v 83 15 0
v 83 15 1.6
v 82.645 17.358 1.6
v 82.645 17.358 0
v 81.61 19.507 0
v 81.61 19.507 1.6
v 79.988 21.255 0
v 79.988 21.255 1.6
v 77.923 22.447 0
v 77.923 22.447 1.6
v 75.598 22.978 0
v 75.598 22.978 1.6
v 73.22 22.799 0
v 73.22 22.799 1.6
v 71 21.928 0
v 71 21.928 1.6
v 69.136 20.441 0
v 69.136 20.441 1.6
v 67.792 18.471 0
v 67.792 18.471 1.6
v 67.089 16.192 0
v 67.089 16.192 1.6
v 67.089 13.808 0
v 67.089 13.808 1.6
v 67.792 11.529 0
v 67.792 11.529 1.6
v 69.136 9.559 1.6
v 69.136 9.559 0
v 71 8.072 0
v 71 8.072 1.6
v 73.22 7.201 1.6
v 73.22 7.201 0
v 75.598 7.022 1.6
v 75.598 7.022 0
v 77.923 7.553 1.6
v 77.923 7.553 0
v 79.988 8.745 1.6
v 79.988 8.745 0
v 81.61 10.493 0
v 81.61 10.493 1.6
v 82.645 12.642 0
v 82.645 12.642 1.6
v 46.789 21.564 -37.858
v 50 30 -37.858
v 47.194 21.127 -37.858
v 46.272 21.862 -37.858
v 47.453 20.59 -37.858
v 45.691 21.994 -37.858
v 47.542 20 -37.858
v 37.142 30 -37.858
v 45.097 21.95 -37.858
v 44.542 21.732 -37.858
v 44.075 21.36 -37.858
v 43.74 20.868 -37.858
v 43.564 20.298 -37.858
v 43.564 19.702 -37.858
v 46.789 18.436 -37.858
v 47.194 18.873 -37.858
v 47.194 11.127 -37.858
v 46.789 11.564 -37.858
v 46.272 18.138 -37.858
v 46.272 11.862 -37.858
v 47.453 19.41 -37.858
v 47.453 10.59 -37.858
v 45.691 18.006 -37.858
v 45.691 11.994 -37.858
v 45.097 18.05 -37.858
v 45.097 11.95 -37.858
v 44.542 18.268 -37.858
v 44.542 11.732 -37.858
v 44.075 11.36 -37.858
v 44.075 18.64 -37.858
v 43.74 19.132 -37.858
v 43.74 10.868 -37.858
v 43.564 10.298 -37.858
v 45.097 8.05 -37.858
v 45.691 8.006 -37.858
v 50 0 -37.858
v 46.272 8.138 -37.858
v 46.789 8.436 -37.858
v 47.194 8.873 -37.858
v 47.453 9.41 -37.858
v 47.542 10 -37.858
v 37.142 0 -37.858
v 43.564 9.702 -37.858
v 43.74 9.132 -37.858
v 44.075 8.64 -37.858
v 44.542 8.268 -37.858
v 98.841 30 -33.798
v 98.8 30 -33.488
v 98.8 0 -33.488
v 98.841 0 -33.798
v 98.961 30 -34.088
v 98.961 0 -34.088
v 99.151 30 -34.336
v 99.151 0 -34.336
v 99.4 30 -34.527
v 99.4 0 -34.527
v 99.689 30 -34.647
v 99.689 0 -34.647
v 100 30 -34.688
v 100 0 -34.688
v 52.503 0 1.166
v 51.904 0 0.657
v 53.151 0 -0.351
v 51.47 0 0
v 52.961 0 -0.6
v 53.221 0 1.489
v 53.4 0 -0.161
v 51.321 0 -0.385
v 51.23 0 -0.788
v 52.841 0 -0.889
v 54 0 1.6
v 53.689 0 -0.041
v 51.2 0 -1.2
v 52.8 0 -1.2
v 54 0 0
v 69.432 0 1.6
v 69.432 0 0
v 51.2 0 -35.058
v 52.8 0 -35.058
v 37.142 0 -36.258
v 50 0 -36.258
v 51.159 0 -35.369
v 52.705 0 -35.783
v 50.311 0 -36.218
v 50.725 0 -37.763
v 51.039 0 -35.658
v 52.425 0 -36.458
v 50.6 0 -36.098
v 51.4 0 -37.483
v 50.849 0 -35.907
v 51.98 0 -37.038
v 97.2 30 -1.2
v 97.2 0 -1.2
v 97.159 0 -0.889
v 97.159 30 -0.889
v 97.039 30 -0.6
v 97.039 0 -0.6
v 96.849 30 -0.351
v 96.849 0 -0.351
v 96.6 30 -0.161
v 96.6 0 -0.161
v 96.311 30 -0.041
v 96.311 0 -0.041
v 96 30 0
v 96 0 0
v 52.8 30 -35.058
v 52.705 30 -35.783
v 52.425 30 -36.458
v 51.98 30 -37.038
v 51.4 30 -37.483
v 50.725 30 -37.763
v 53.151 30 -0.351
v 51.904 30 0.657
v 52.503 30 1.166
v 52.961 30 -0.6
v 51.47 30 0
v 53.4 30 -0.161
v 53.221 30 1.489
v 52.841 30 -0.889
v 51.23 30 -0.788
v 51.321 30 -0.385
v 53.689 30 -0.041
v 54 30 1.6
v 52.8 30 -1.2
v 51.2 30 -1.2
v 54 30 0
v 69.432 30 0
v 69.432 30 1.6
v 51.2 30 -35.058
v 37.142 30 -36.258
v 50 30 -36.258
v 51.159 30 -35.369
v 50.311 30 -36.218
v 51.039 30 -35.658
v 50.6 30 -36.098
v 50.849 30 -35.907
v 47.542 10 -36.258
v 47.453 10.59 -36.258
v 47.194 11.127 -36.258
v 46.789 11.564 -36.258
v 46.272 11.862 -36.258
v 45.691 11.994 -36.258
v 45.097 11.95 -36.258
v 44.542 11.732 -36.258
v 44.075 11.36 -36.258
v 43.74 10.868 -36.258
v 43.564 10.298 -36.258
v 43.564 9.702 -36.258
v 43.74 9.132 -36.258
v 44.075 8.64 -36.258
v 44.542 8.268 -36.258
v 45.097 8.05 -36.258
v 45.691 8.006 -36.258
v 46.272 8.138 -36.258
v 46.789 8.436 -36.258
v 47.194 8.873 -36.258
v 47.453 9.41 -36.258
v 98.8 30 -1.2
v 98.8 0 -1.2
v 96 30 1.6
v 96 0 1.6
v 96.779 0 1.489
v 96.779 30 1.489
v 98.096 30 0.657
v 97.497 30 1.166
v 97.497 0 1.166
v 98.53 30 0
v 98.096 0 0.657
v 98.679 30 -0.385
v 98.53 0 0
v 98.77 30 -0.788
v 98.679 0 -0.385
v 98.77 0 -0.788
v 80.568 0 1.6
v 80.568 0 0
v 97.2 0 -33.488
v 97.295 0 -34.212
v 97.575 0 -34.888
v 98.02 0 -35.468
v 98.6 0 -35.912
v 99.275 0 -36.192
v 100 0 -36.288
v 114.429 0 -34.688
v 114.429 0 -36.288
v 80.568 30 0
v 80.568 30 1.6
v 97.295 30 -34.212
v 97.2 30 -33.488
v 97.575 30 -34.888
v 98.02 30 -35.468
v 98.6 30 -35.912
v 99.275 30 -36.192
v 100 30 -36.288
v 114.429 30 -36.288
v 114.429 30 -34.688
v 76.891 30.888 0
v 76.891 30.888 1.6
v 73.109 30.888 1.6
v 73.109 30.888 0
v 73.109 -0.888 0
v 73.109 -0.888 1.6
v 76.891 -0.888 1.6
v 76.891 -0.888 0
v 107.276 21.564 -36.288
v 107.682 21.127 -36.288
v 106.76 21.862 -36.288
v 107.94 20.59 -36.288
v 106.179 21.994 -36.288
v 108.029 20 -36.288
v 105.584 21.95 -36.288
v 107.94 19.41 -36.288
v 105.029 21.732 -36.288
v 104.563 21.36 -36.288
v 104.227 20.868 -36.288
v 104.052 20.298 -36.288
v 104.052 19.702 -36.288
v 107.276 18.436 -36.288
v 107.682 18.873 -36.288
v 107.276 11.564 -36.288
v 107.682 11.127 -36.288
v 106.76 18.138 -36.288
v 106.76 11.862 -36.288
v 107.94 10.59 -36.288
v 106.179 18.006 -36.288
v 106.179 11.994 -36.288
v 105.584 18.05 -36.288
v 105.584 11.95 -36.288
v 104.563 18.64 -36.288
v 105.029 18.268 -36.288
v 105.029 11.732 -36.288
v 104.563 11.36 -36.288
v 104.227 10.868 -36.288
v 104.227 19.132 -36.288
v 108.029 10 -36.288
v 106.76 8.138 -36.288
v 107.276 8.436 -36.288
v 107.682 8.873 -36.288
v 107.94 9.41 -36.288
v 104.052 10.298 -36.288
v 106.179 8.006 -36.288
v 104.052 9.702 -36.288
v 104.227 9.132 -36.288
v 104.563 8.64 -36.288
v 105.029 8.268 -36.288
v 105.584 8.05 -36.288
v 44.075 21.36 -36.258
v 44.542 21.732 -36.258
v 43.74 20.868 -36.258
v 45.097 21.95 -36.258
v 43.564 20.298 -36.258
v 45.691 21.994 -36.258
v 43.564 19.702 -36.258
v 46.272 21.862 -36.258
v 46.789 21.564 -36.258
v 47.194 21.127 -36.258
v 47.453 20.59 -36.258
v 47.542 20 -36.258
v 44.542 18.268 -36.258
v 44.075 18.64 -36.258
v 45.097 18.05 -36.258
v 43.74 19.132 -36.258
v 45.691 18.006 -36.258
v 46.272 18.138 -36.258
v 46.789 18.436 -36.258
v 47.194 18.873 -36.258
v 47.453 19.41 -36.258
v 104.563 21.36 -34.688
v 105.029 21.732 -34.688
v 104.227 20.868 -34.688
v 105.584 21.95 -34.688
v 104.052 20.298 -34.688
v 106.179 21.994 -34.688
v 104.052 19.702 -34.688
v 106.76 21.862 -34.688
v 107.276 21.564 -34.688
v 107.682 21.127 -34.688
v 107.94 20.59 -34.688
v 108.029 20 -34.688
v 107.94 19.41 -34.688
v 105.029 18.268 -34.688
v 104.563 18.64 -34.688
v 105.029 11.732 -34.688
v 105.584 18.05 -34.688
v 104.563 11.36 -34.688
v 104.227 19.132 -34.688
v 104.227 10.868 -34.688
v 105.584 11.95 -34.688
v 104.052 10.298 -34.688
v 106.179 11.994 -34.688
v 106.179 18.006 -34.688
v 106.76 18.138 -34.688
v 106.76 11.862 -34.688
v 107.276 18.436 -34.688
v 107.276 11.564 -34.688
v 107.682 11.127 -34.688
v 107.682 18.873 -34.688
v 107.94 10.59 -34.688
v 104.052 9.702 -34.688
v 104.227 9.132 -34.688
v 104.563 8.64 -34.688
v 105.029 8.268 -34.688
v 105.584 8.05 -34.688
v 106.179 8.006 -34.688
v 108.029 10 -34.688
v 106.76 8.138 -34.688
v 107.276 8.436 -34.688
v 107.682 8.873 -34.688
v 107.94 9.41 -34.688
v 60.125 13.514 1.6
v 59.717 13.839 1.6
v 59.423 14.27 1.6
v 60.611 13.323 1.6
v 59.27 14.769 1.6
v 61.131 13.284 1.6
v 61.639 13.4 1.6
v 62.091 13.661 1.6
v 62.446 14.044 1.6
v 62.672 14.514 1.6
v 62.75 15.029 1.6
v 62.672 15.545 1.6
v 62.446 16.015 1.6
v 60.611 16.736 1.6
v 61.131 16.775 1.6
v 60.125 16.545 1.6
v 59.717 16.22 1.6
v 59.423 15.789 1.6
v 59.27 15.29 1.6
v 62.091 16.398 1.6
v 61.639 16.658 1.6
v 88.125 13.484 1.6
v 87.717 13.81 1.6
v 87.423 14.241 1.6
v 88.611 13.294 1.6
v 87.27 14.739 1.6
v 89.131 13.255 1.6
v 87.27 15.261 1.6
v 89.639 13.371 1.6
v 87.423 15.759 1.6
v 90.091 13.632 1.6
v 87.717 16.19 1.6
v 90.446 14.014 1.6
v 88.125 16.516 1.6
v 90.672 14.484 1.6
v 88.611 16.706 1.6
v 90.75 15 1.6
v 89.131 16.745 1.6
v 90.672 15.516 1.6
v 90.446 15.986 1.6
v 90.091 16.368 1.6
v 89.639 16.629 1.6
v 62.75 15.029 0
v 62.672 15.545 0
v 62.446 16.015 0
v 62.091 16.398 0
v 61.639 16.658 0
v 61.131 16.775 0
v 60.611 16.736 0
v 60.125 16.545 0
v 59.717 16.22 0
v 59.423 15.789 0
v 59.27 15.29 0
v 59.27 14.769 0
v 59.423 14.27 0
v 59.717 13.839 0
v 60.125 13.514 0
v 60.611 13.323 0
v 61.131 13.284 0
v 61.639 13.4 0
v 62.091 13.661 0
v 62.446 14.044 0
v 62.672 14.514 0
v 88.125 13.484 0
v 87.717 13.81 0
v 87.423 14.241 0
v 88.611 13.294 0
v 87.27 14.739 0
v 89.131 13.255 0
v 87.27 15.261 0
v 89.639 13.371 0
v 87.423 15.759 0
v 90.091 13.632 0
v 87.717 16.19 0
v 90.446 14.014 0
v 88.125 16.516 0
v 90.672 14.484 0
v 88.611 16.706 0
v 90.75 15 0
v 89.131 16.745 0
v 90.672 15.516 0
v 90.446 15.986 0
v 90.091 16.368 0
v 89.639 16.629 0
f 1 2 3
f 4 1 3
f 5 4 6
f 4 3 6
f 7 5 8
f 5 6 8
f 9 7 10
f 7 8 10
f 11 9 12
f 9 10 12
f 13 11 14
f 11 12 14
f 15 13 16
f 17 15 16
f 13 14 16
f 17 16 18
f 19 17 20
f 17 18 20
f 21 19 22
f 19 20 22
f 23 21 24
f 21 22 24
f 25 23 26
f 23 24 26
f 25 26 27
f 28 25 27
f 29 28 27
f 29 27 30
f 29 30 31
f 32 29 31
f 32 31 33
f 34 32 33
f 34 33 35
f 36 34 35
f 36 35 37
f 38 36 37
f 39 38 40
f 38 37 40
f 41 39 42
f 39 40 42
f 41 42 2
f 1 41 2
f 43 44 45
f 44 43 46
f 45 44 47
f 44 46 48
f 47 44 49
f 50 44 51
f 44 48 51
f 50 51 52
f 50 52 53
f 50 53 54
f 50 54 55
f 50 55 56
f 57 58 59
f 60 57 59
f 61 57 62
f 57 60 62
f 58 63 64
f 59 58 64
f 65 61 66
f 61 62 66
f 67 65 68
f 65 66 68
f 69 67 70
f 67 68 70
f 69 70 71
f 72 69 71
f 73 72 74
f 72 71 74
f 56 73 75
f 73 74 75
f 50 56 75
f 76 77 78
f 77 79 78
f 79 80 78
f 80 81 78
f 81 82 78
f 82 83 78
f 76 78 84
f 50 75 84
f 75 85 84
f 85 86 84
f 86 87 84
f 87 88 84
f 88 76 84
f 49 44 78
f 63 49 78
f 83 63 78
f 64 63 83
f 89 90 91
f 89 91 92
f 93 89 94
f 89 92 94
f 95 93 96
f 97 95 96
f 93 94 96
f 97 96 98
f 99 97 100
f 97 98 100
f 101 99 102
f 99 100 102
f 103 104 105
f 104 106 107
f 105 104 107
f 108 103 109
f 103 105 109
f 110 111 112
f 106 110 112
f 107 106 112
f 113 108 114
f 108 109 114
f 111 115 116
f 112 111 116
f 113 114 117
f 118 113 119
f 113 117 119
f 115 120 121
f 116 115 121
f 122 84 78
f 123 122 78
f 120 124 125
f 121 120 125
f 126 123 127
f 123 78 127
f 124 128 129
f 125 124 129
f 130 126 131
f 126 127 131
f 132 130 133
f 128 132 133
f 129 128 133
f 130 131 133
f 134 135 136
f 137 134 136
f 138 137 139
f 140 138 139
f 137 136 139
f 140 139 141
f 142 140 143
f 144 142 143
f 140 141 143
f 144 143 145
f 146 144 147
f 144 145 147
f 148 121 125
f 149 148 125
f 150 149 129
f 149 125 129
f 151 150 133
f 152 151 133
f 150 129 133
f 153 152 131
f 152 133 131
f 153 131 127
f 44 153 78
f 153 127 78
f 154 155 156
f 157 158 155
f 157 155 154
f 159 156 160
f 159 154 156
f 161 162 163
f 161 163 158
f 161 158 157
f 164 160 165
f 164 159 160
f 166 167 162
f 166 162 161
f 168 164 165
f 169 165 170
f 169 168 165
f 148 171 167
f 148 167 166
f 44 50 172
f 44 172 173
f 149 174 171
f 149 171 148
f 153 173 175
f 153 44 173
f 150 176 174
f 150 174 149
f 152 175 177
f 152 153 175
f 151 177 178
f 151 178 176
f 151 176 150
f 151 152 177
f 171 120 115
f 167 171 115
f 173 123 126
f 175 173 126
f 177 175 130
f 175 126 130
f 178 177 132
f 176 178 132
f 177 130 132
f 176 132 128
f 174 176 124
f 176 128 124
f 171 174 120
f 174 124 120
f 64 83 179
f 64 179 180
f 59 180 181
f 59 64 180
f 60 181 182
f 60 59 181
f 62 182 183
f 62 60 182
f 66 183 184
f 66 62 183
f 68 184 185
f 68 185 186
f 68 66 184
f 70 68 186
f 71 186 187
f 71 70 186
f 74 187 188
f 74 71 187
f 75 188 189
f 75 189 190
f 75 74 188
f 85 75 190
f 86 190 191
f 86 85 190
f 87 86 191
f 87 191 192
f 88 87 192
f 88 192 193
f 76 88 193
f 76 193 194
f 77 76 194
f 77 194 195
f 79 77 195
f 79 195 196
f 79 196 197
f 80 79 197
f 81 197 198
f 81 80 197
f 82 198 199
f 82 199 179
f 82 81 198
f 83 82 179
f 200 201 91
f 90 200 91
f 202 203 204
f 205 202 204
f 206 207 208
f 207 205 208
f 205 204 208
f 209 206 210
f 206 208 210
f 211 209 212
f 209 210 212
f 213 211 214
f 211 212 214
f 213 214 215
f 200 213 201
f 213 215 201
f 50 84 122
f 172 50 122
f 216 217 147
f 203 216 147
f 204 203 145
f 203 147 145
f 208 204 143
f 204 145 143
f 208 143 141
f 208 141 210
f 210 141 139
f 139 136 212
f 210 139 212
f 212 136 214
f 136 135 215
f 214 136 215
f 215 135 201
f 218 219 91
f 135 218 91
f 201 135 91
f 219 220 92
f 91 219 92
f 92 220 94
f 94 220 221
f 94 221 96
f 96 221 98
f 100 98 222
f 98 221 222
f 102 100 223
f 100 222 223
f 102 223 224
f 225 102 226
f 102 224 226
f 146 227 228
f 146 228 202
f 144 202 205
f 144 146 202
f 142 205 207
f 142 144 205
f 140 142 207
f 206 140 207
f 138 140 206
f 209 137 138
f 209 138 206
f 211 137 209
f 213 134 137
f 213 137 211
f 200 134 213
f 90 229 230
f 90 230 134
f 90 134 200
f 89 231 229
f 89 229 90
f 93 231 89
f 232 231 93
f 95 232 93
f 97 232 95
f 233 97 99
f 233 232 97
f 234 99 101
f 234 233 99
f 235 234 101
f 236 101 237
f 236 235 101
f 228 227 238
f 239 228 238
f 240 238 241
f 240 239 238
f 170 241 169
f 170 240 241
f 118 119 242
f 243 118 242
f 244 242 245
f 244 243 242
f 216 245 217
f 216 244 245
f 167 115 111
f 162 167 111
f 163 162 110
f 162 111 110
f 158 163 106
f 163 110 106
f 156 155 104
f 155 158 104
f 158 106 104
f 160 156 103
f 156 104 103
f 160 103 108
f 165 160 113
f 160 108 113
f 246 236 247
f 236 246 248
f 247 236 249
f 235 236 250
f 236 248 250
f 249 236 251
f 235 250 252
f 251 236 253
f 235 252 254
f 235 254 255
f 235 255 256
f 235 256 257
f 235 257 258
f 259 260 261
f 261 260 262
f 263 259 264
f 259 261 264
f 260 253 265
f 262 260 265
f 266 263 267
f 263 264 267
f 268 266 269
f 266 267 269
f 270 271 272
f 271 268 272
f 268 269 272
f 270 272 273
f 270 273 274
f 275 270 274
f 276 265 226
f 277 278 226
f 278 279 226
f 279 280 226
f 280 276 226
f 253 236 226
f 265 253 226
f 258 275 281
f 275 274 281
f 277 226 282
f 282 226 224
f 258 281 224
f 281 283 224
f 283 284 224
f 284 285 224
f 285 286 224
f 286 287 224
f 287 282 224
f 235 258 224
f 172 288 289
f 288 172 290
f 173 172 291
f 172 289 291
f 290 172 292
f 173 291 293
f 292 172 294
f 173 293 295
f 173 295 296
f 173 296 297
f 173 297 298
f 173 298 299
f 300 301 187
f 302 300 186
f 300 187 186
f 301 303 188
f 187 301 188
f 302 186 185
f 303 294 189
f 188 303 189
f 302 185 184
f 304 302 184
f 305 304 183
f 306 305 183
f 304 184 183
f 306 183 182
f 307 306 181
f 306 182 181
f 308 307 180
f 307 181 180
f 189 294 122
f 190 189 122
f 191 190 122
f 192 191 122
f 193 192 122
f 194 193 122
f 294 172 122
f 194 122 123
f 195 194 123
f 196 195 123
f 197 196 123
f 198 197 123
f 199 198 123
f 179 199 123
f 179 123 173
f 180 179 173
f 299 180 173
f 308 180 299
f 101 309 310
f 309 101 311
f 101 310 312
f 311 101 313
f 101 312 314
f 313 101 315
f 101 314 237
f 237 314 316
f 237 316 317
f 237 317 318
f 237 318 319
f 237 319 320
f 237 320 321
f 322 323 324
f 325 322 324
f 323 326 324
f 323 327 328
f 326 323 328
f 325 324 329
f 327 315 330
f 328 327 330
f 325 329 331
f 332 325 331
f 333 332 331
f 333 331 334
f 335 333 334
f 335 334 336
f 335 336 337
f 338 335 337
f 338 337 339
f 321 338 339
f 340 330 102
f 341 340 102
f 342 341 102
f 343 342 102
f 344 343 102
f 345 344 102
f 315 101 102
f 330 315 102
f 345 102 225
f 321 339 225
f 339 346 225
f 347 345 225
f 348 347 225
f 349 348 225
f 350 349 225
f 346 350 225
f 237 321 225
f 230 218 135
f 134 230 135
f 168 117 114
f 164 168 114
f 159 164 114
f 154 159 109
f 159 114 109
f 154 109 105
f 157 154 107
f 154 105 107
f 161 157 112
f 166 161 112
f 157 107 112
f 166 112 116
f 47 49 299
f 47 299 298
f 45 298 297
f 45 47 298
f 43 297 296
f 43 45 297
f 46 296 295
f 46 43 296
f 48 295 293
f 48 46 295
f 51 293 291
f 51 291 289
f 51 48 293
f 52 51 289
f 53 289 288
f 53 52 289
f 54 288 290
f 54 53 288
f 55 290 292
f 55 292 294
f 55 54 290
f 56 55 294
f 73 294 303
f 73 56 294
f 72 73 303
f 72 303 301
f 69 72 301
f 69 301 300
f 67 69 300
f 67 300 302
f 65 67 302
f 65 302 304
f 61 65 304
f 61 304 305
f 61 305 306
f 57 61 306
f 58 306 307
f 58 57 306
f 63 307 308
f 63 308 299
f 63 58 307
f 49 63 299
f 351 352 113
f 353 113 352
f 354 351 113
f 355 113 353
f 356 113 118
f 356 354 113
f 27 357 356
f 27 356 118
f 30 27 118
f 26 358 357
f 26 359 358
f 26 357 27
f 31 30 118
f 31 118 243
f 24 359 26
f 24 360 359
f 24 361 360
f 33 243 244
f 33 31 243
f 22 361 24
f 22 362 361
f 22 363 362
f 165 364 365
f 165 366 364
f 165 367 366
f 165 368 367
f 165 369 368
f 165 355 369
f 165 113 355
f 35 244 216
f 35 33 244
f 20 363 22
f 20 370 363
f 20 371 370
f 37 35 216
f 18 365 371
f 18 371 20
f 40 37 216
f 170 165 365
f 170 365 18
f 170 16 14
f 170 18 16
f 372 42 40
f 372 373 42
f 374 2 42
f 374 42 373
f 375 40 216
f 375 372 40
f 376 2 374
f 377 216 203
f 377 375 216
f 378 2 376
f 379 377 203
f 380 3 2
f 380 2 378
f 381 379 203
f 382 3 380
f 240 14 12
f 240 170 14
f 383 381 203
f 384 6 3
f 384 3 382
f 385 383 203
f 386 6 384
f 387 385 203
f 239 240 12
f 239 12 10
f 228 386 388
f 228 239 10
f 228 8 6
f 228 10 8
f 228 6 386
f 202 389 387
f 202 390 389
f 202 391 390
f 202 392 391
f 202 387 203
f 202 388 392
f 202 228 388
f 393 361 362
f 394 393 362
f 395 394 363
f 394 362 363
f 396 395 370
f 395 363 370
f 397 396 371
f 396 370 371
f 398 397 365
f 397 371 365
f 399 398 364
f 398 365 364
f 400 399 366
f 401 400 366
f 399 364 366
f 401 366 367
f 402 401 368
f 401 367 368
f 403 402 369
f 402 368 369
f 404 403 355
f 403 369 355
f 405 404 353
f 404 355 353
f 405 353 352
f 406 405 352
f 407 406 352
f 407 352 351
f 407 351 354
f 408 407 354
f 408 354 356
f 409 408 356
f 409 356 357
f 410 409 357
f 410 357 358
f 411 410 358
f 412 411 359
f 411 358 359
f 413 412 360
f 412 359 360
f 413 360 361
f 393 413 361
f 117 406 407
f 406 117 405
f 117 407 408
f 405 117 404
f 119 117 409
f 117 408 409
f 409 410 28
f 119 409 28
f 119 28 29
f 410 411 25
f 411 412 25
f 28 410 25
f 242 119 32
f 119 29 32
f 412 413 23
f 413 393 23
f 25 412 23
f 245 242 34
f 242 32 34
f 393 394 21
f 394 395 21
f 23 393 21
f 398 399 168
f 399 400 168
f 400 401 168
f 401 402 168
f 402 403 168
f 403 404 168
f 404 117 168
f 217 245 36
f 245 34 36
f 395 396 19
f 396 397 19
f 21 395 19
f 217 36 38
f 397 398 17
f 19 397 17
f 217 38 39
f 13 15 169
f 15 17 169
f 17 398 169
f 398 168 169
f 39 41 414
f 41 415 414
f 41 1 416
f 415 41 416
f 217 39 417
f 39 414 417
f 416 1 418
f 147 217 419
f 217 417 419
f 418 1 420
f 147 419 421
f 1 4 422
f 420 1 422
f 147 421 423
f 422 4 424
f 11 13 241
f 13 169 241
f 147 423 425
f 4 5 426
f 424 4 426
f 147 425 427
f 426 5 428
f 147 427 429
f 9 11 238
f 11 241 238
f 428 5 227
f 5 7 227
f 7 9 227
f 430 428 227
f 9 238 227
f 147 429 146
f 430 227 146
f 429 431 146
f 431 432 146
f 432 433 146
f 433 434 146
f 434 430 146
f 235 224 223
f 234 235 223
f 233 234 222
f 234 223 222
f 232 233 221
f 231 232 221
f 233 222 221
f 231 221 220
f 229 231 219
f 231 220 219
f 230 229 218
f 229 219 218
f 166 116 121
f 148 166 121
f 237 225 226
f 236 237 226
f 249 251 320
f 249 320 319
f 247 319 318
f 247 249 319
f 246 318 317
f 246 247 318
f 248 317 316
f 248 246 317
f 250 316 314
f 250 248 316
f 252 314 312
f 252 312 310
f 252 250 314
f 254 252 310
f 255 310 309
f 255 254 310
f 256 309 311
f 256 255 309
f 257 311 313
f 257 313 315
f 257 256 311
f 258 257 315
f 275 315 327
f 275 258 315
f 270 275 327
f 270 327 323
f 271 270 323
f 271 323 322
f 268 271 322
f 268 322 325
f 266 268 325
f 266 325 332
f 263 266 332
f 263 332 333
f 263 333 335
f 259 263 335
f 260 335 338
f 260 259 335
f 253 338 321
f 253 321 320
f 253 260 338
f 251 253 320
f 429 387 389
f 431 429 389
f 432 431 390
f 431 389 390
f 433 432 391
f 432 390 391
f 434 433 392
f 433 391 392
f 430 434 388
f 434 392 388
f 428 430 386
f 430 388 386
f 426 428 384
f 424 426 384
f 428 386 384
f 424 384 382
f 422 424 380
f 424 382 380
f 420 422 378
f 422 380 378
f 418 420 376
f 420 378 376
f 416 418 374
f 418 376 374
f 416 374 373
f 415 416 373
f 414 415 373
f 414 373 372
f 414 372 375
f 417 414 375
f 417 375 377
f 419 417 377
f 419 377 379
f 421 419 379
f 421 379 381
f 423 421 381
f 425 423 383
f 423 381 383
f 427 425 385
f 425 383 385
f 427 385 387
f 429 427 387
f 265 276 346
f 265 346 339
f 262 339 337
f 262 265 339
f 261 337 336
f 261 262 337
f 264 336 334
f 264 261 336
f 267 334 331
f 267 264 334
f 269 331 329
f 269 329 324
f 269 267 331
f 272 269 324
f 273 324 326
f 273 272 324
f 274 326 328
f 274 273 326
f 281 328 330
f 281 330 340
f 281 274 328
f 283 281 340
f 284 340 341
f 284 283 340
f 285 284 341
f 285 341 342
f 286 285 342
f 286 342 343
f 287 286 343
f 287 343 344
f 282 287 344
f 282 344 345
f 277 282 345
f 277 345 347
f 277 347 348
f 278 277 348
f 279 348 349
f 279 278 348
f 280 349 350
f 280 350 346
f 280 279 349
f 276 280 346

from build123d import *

# Parameters (mm, degrees)
SKETCH1_W                  = 149
SKETCH1_H                  = 30
BOSS_EXTRUDE1_DEPTH        = 1.6
SKETCH4_R                  = 16
BOSS_EXTRUDE2_DEPTH        = 1.6
SKETCH5_R                  = 8
CUT_EXTRUDE1_DEPTH         = 1.6
SKETCH6_R                  = 1.75
CUT_EXTRUDE2_DEPTH         = 1.6
SKETCH7_R                  = 2
CUT_EXTRUDE3_DEPTH         = 1.6
SKETCH8_W                  = 1
SKETCH8_H                  = 30
CUT_EXTRUDE4_DEPTH         = 1.6
SKETCHED_START             = 134.229203673
SKETCHED_BEND1_OUTLINE_W   = 30
SKETCHED_BEND1_OUTLINE_H   = 1.6
SKETCHED_BEND1_DEPTH       = 14.770796327
SKETCHED_START_2           = 132.629203673
SKETCHED_BEND1_2_OUTLINE_W = 30
SKETCHED_BEND1_2_OUTLINE_H = 15.629203673
SKETCHED_BEND1_2_OUTLINE_R = 2
SKETCHED_BEND1_2_DEPTH     = 1.304264
SKETCHED_START_3           = 134.060211673
SKETCHED_BEND1_3_OUTLINE_W = 30
SKETCHED_BEND1_3_OUTLINE_H = 1.6
SKETCHED_BEND1_3_DEPTH     = 0.168992
SKETCHED_START_4           = 131.429203673
SKETCHED_BEND1_4_OUTLINE_W = 30
SKETCHED_BEND1_4_OUTLINE_H = 15.629203673
SKETCHED_BEND1_4_OUTLINE_R = 2
SKETCHED_BEND1_4_DEPTH     = 2.8
SKETCHED_BEND1_5_DEPTH     = 30
SKETCHED_BEND3_DEPTH       = 30
SKETCHED_BEND3_2_DEPTH     = 7.9999999
SKETCHED_START_5           = 22.0000001
SKETCHED_BEND3_3_DEPTH     = 7.9999999
SKETCHED_START_6           = 12.0000001
SKETCHED_BEND3_4_DEPTH     = 5.9999998
SKETCHED_START_7           = 7.9999999
SKETCHED_BEND3_5_DEPTH     = 14.0000002
SKETCHED_START_8           = -36.28761102
SKETCHED_BEND3_6_OUTLINE_R = 2
SKETCHED_BEND3_6_DEPTH     = 1.6
SKETCHED_BEND4_DEPTH       = 30
SKETCHED_BEND4_2_DEPTH     = 7.9999999
SKETCHED_BEND4_3_DEPTH     = 7.9999999
SKETCHED_BEND4_4_DEPTH     = 5.9999998
SKETCHED_BEND4_5_DEPTH     = 14.0000002
SKETCHED_START_9           = 14.2
SKETCHED_BEND4_6_OUTLINE_R = 2
SKETCHED_BEND4_6_DEPTH     = 1.6
SKETCHED_BEND5_DEPTH       = 30
SKETCHED_BEND5_2_DEPTH     = 7.9999999
SKETCHED_BEND5_3_DEPTH     = 7.9999999
SKETCHED_BEND5_4_DEPTH     = 5.9999998
SKETCHED_BEND5_5_DEPTH     = 14.0000002
SKETCHED_START_10          = -37.858407346
SKETCHED_BEND5_6_OUTLINE_R = 2
SKETCHED_BEND5_6_DEPTH     = 1.6


with BuildPart() as part:
    # Sketch1 → Boss-Extrude1 (new body)
    with BuildSketch(Plane.XY):
        with Locations((74.5, 15)):
            Rectangle(SKETCH1_W, SKETCH1_H)
    extrude(amount=BOSS_EXTRUDE1_DEPTH)

    # Sketch4 → Boss-Extrude2 (add)
    with BuildSketch(Plane.XY.offset(1.6)):
        with Locations((75, 15)):
            Circle(SKETCH4_R)
    extrude(amount=-BOSS_EXTRUDE2_DEPTH)

    # Sketch5 → Cut-Extrude1 (cut)
    with BuildSketch(Plane.XY.offset(1.6)):
        with Locations((75, 15)):
            Circle(SKETCH5_R)
    extrude(amount=-CUT_EXTRUDE1_DEPTH, mode=Mode.SUBTRACT)

    # Sketch6 → Cut-Extrude2 (cut)
    with BuildSketch(Plane.XY.offset(1.6)):
        with Locations((89, 15)):
            Circle(SKETCH6_R)
        with Locations((61, 15.029414059)):
            Circle(SKETCH6_R)
    extrude(amount=-CUT_EXTRUDE2_DEPTH, mode=Mode.SUBTRACT)

    # Sketch7 → Cut-Extrude3 (cut)
    with BuildSketch(Plane.XY.offset(1.6)):
        with Locations((140.6, 20)):
            Circle(SKETCH7_R)
        with Locations((140.6, 10)):
            Circle(SKETCH7_R)
    cut_extrude3 = extrude(amount=-CUT_EXTRUDE3_DEPTH, mode=Mode.SUBTRACT)

    # Sketch8 → Cut-Extrude4 (cut)
    with BuildSketch(Plane.XY.offset(1.6)):
        with Locations((0.5, 15)):
            Rectangle(SKETCH8_W, SKETCH8_H)
    extrude(amount=-CUT_EXTRUDE4_DEPTH, mode=Mode.SUBTRACT)

    # Mirror1: Cut-Extrude3 across plane
    add(cut_extrude3.mirror(Plane(origin=(75, 0, 0), x_dir=(0, 0, 1), z_dir=(1, 0, 0))), mode=Mode.SUBTRACT)

    # Sketched Bend1: read off the stored shape, not the designer's step
    # Sketched Bend1 outline → Sketched Bend1 (cut)
    with BuildSketch(Plane.YZ.offset(SKETCHED_START)):
        with Locations((15, 0.8)):
            Rectangle(SKETCHED_BEND1_OUTLINE_W, SKETCHED_BEND1_OUTLINE_H)
    extrude(amount=SKETCHED_BEND1_DEPTH, mode=Mode.SUBTRACT)

    # Sketched Bend1 2 outline → Sketched Bend1 2 (add)
    with BuildSketch(Plane.YZ.offset(SKETCHED_START_2)):
        with Locations((15, 9.414601837)):
            Rectangle(SKETCHED_BEND1_2_OUTLINE_W, SKETCHED_BEND1_2_OUTLINE_H)
        with Locations((10, 8.829203673)):
            Circle(SKETCHED_BEND1_2_OUTLINE_R, mode=Mode.SUBTRACT)
        with Locations((20, 8.829203673)):
            Circle(SKETCHED_BEND1_2_OUTLINE_R, mode=Mode.SUBTRACT)
    extrude(amount=SKETCHED_BEND1_2_DEPTH)

    # Sketched Bend1 3 outline → Sketched Bend1 3 (cut)
    with BuildSketch(Plane.YZ.offset(SKETCHED_START_3)):
        with Locations((15, 0.8)):
            Rectangle(SKETCHED_BEND1_3_OUTLINE_W, SKETCHED_BEND1_3_OUTLINE_H)
    extrude(amount=SKETCHED_BEND1_3_DEPTH, mode=Mode.SUBTRACT)

    # Sketched Bend1 4 outline → Sketched Bend1 4 (add)
    with BuildSketch(Plane.YZ.offset(SKETCHED_START_4)):
        with Locations((15, 9.414601837)):
            Rectangle(SKETCHED_BEND1_4_OUTLINE_W, SKETCHED_BEND1_4_OUTLINE_H)
        with Locations((10, 8.829203673)):
            Circle(SKETCHED_BEND1_4_OUTLINE_R, mode=Mode.SUBTRACT)
        with Locations((20, 8.829203673)):
            Circle(SKETCHED_BEND1_4_OUTLINE_R, mode=Mode.SUBTRACT)
    extrude(amount=SKETCHED_BEND1_4_DEPTH)

    # Sketched Bend1 5 outline → Sketched Bend1 5 (cut)
    with BuildSketch(Plane(origin=(0, 0, 0), x_dir=(1, 0, 0), z_dir=(0, 1, 0))):
        with BuildLine():
            Line((131.429203673, -17.229203673), (132.629203673, -17.229203673))
            Line((132.629203673, -17.229203673), (132.629203673, -2.8))
            ThreePointArc((132.629203673, -2.8), (132.277731811, -1.951471862), (131.429203673, -1.6))
            Line((131.429203673, -1.6), (131.429203673, -17.229203673))
        make_face()
        with BuildLine():
            ThreePointArc((131.429203673, 0), (133.40910266, -0.820101012), (134.229203673, -2.8))
            Line((134.229203673, -2.8), (134.229203673, -1.6))
            Line((134.229203673, -1.6), (134.060211673, -1.6))
            Line((134.060211673, -1.6), (134.060211673, 0))
            Line((134.060211673, 0), (131.429203673, 0))
        make_face()
    extrude(amount=SKETCHED_BEND1_5_DEPTH, mode=Mode.SUBTRACT)

    # Sketched Bend3: read off the stored shape, not the designer's step
    # Sketched Bend3 outline → Sketched Bend3 (cut)
    with BuildSketch(Plane(origin=(0, 0, 0), x_dir=(1, 0, 0), z_dir=(0, 1, 0))):
        with BuildLine():
            Line((131.429203673, 0), (98.529822128, 0))
            ThreePointArc((98.529822128, 0), (97.496662954, -1.166431913), (96, -1.6))
            Line((96, -1.6), (131.429203673, -1.6))
            ThreePointArc((131.429203673, -1.6), (132.277731811, -1.951471862), (132.629203673, -2.8))
            Line((132.629203673, -2.8), (132.629203673, -17.229203673))
            Line((132.629203673, -17.229203673), (134.229203673, -17.229203673))
            Line((134.229203673, -17.229203673), (134.229203673, -2.8))
            ThreePointArc((134.229203673, -2.8), (133.40910266, -0.820101012), (131.429203673, 0))
        make_face()
    extrude(amount=SKETCHED_BEND3_DEPTH, mode=Mode.SUBTRACT)

    # Sketched Bend3 2 outline → Sketched Bend3 2 (add)
    with BuildSketch(Plane(origin=(0, 0, 0), x_dir=(1, 0, 0), z_dir=(0, 1, 0))):
        with BuildLine():
            ThreePointArc((100, 36.28761102), (98.020101013, 35.467510007), (97.2, 33.48761102))
            Line((97.2, 33.48761102), (97.2, 1.2))
            ThreePointArc((97.2, 1.2), (96.848528137, 0.351471863), (96, 0))
            Line((96, 0), (98.529822128, 0))
            ThreePointArc((98.529822128, 0), (98.731620577, 0.584980471), (98.8, 1.2))
            Line((98.8, 1.2), (98.8, 33.48761102))
            ThreePointArc((98.8, 33.48761102), (99.151471863, 34.336139157), (100, 34.68761102))
            Line((100, 34.68761102), (114.429203673, 34.68761102))
            Line((114.429203673, 34.68761102), (114.429203673, 36.28761102))
            Line((114.429203673, 36.28761102), (100, 36.28761102))
        make_face()
    extrude(amount=SKETCHED_BEND3_2_DEPTH)

    # Sketched Bend3 3 outline → Sketched Bend3 3 (add)
    with BuildSketch(Plane(origin=(0, 0, 0), x_dir=(1, 0, 0), z_dir=(0, 1, 0)).offset(SKETCHED_START_5)):
        with BuildLine():
            ThreePointArc((100, 36.28761102), (98.020101013, 35.467510007), (97.2, 33.48761102))
            Line((97.2, 33.48761102), (97.2, 1.2))
            ThreePointArc((97.2, 1.2), (96.848528137, 0.351471863), (96, 0))
            Line((96, 0), (98.529822128, 0))
            ThreePointArc((98.529822128, 0), (98.731620577, 0.584980471), (98.8, 1.2))
            Line((98.8, 1.2), (98.8, 33.48761102))
            ThreePointArc((98.8, 33.48761102), (99.151471863, 34.336139157), (100, 34.68761102))
            Line((100, 34.68761102), (114.429203673, 34.68761102))
            Line((114.429203673, 34.68761102), (114.429203673, 36.28761102))
            Line((114.429203673, 36.28761102), (100, 36.28761102))
        make_face()
    extrude(amount=SKETCHED_BEND3_3_DEPTH)

    # Sketched Bend3 4 outline → Sketched Bend3 4 (add)
    with BuildSketch(Plane(origin=(0, 0, 0), x_dir=(1, 0, 0), z_dir=(0, 1, 0)).offset(SKETCHED_START_6)):
        with BuildLine():
            ThreePointArc((100, 36.28761102), (98.020101013, 35.467510007), (97.2, 33.48761102))
            Line((97.2, 33.48761102), (97.2, 1.2))
            ThreePointArc((97.2, 1.2), (96.848528137, 0.351471863), (96, 0))
            Line((96, 0), (98.529822128, 0))
            ThreePointArc((98.529822128, 0), (98.731620577, 0.584980471), (98.8, 1.2))
            Line((98.8, 1.2), (98.8, 33.48761102))
            ThreePointArc((98.8, 33.48761102), (99.151471863, 34.336139157), (100, 34.68761102))
            Line((100, 34.68761102), (114.429203673, 34.68761102))
            Line((114.429203673, 34.68761102), (114.429203673, 36.28761102))
            Line((114.429203673, 36.28761102), (100, 36.28761102))
        make_face()
    extrude(amount=SKETCHED_BEND3_4_DEPTH)

    # Sketched Bend3 5 outline → Sketched Bend3 5 (add)
    with BuildSketch(Plane(origin=(0, 0, 0), x_dir=(1, 0, 0), z_dir=(0, 1, 0)).offset(SKETCHED_START_7)):
        with BuildLine():
            ThreePointArc((100, 36.28761102), (98.020101013, 35.467510007), (97.2, 33.48761102))
            Line((97.2, 33.48761102), (97.2, 1.2))
            ThreePointArc((97.2, 1.2), (96.848528137, 0.351471863), (96, 0))
            Line((96, 0), (98.529822128, 0))
            ThreePointArc((98.529822128, 0), (98.731620577, 0.584980471), (98.8, 1.2))
            Line((98.8, 1.2), (98.8, 33.48761102))
            ThreePointArc((98.8, 33.48761102), (99.151471863, 34.336139157), (100, 34.68761102))
            Line((100, 34.68761102), (114.429203673, 34.68761102))
            Line((114.429203673, 34.68761102), (114.429203673, 36.28761102))
            Line((114.429203673, 36.28761102), (100, 36.28761102))
        make_face()
    extrude(amount=SKETCHED_BEND3_5_DEPTH)

    # Sketched Bend3 6 outline → Sketched Bend3 6 (cut)
    with BuildSketch(Plane.XY.offset(SKETCHED_START_8)):
        with Locations((106.029203673, 20)):
            Circle(SKETCHED_BEND3_6_OUTLINE_R)
        with Locations((106.029203673, 10)):
            Circle(SKETCHED_BEND3_6_OUTLINE_R)
    extrude(amount=SKETCHED_BEND3_6_DEPTH, mode=Mode.SUBTRACT)

    # Sketched Bend4: read off the stored shape, not the designer's step
    # Sketched Bend4 outline → Sketched Bend4 (cut)
    with BuildSketch(Plane(origin=(0, 0, 0), x_dir=(1, 0, 0), z_dir=(0, 1, 0))):
        with BuildLine():
            Line((1, -1.6), (14.470177872, -1.6))
            ThreePointArc((14.470177872, -1.6), (15.503337046, -0.433568087), (17, 0))
            Line((17, 0), (1, 0))
            Line((1, 0), (1, -1.6))
        make_face()
    extrude(amount=SKETCHED_BEND4_DEPTH, mode=Mode.SUBTRACT)

    # Sketched Bend4 2 outline → Sketched Bend4 2 (add)
    with BuildSketch(Plane(origin=(0, 0, 0), x_dir=(1, 0, 0), z_dir=(0, 1, 0))):
        with BuildLine():
            Line((15.8, -15.658407346), (15.8, -2.8))
            ThreePointArc((15.8, -2.8), (16.151471863, -1.951471863), (17, -1.6))
            Line((17, -1.6), (14.470177872, -1.6))
            ThreePointArc((14.470177872, -1.6), (14.268379423, -2.184980471), (14.2, -2.8))
            Line((14.2, -2.8), (14.2, -15.658407346))
            Line((14.2, -15.658407346), (15.8, -15.658407346))
        make_face()
    extrude(amount=SKETCHED_BEND4_2_DEPTH)

    # Sketched Bend4 3 outline → Sketched Bend4 3 (add)
    with BuildSketch(Plane(origin=(0, 0, 0), x_dir=(1, 0, 0), z_dir=(0, 1, 0)).offset(SKETCHED_START_5)):
        with BuildLine():
            Line((15.8, -15.658407346), (15.8, -2.8))
            ThreePointArc((15.8, -2.8), (16.151471863, -1.951471863), (17, -1.6))
            Line((17, -1.6), (14.470177872, -1.6))
            ThreePointArc((14.470177872, -1.6), (14.268379423, -2.184980471), (14.2, -2.8))
            Line((14.2, -2.8), (14.2, -15.658407346))
            Line((14.2, -15.658407346), (15.8, -15.658407346))
        make_face()
    extrude(amount=SKETCHED_BEND4_3_DEPTH)

    # Sketched Bend4 4 outline → Sketched Bend4 4 (add)
    with BuildSketch(Plane(origin=(0, 0, 0), x_dir=(1, 0, 0), z_dir=(0, 1, 0)).offset(SKETCHED_START_6)):
        with BuildLine():
            Line((15.8, -15.658407346), (15.8, -2.8))
            ThreePointArc((15.8, -2.8), (16.151471863, -1.951471863), (17, -1.6))
            Line((17, -1.6), (14.470177872, -1.6))
            ThreePointArc((14.470177872, -1.6), (14.268379423, -2.184980471), (14.2, -2.8))
            Line((14.2, -2.8), (14.2, -15.658407346))
            Line((14.2, -15.658407346), (15.8, -15.658407346))
        make_face()
    extrude(amount=SKETCHED_BEND4_4_DEPTH)

    # Sketched Bend4 5 outline → Sketched Bend4 5 (add)
    with BuildSketch(Plane(origin=(0, 0, 0), x_dir=(1, 0, 0), z_dir=(0, 1, 0)).offset(SKETCHED_START_7)):
        with BuildLine():
            Line((15.8, -15.658407346), (15.8, -2.8))
            ThreePointArc((15.8, -2.8), (16.151471863, -1.951471863), (17, -1.6))
            Line((17, -1.6), (14.470177872, -1.6))
            ThreePointArc((14.470177872, -1.6), (14.268379423, -2.184980471), (14.2, -2.8))
            Line((14.2, -2.8), (14.2, -15.658407346))
            Line((14.2, -15.658407346), (15.8, -15.658407346))
        make_face()
    extrude(amount=SKETCHED_BEND4_5_DEPTH)

    # Sketched Bend4 6 outline → Sketched Bend4 6 (cut)
    with BuildSketch(Plane.YZ.offset(SKETCHED_START_9)):
        with Locations((20, 7.258407346)):
            Circle(SKETCHED_BEND4_6_OUTLINE_R)
        with Locations((10, 7.258407346)):
            Circle(SKETCHED_BEND4_6_OUTLINE_R)
    extrude(amount=SKETCHED_BEND4_6_DEPTH, mode=Mode.SUBTRACT)

    # Sketched Bend5: read off the stored shape, not the designer's step
    # Sketched Bend5 outline → Sketched Bend5 (cut)
    with BuildSketch(Plane(origin=(0, 0, 0), x_dir=(1, 0, 0), z_dir=(0, 1, 0))):
        with BuildLine():
            Line((17, -1.6), (54, -1.6))
            ThreePointArc((54, -1.6), (52.503337046, -1.166431913), (51.470177872, 0))
            Line((51.470177872, 0), (17, 0))
            ThreePointArc((17, 0), (15.020101013, -0.820101013), (14.2, -2.8))
            Line((14.2, -2.8), (14.2, -15.658407346))
            Line((14.2, -15.658407346), (15.8, -15.658407346))
            Line((15.8, -15.658407346), (15.8, -2.8))
            ThreePointArc((15.8, -2.8), (16.151471863, -1.951471863), (17, -1.6))
        make_face()
    extrude(amount=SKETCHED_BEND5_DEPTH, mode=Mode.SUBTRACT)

    # Sketched Bend5 2 outline → Sketched Bend5 2 (add)
    with BuildSketch(Plane(origin=(0, 0, 0), x_dir=(1, 0, 0), z_dir=(0, 1, 0))):
        with BuildLine():
            ThreePointArc((51.2, 1.2), (51.268379423, 0.584980471), (51.470177872, 0))
            Line((51.470177872, 0), (54, 0))
            ThreePointArc((54, 0), (53.151471863, 0.351471863), (52.8, 1.2))
            Line((52.8, 1.2), (52.8, 35.058407346))
            ThreePointArc((52.8, 35.058407346), (51.979898987, 37.038306333), (50, 37.858407346))
            Line((50, 37.858407346), (37.141592654, 37.858407346))
            Line((37.141592654, 37.858407346), (37.141592654, 36.258407346))
            Line((37.141592654, 36.258407346), (50, 36.258407346))
            ThreePointArc((50, 36.258407346), (50.848528138, 35.906935483), (51.2, 35.058407346))
            Line((51.2, 35.058407346), (51.2, 1.2))
        make_face()
    extrude(amount=SKETCHED_BEND5_2_DEPTH)

    # Sketched Bend5 3 outline → Sketched Bend5 3 (add)
    with BuildSketch(Plane(origin=(0, 0, 0), x_dir=(1, 0, 0), z_dir=(0, 1, 0)).offset(SKETCHED_START_5)):
        with BuildLine():
            ThreePointArc((51.2, 1.2), (51.268379423, 0.584980471), (51.470177872, 0))
            Line((51.470177872, 0), (54, 0))
            ThreePointArc((54, 0), (53.151471863, 0.351471863), (52.8, 1.2))
            Line((52.8, 1.2), (52.8, 35.058407346))
            ThreePointArc((52.8, 35.058407346), (51.979898987, 37.038306333), (50, 37.858407346))
            Line((50, 37.858407346), (37.141592654, 37.858407346))
            Line((37.141592654, 37.858407346), (37.141592654, 36.258407346))
            Line((37.141592654, 36.258407346), (50, 36.258407346))
            ThreePointArc((50, 36.258407346), (50.848528138, 35.906935483), (51.2, 35.058407346))
            Line((51.2, 35.058407346), (51.2, 1.2))
        make_face()
    extrude(amount=SKETCHED_BEND5_3_DEPTH)

    # Sketched Bend5 4 outline → Sketched Bend5 4 (add)
    with BuildSketch(Plane(origin=(0, 0, 0), x_dir=(1, 0, 0), z_dir=(0, 1, 0)).offset(SKETCHED_START_6)):
        with BuildLine():
            ThreePointArc((51.2, 1.2), (51.268379423, 0.584980471), (51.470177872, 0))
            Line((51.470177872, 0), (54, 0))
            ThreePointArc((54, 0), (53.151471863, 0.351471863), (52.8, 1.2))
            Line((52.8, 1.2), (52.8, 35.058407346))
            ThreePointArc((52.8, 35.058407346), (51.979898987, 37.038306333), (50, 37.858407346))
            Line((50, 37.858407346), (37.141592654, 37.858407346))
            Line((37.141592654, 37.858407346), (37.141592654, 36.258407346))
            Line((37.141592654, 36.258407346), (50, 36.258407346))
            ThreePointArc((50, 36.258407346), (50.848528138, 35.906935483), (51.2, 35.058407346))
            Line((51.2, 35.058407346), (51.2, 1.2))
        make_face()
    extrude(amount=SKETCHED_BEND5_4_DEPTH)

    # Sketched Bend5 5 outline → Sketched Bend5 5 (add)
    with BuildSketch(Plane(origin=(0, 0, 0), x_dir=(1, 0, 0), z_dir=(0, 1, 0)).offset(SKETCHED_START_7)):
        with BuildLine():
            ThreePointArc((51.2, 1.2), (51.268379423, 0.584980471), (51.470177872, 0))
            Line((51.470177872, 0), (54, 0))
            ThreePointArc((54, 0), (53.151471863, 0.351471863), (52.8, 1.2))
            Line((52.8, 1.2), (52.8, 35.058407346))
            ThreePointArc((52.8, 35.058407346), (51.979898987, 37.038306333), (50, 37.858407346))
            Line((50, 37.858407346), (37.141592654, 37.858407346))
            Line((37.141592654, 37.858407346), (37.141592654, 36.258407346))
            Line((37.141592654, 36.258407346), (50, 36.258407346))
            ThreePointArc((50, 36.258407346), (50.848528138, 35.906935483), (51.2, 35.058407346))
            Line((51.2, 35.058407346), (51.2, 1.2))
        make_face()
    extrude(amount=SKETCHED_BEND5_5_DEPTH)

    # Sketched Bend5 6 outline → Sketched Bend5 6 (cut)
    with BuildSketch(Plane.XY.offset(SKETCHED_START_10)):
        with Locations((45.541592654, 20)):
            Circle(SKETCHED_BEND5_6_OUTLINE_R)
        with Locations((45.541592654, 10)):
            Circle(SKETCHED_BEND5_6_OUTLINE_R)
    extrude(amount=SKETCHED_BEND5_6_DEPTH, mode=Mode.SUBTRACT)


solid = part.part
